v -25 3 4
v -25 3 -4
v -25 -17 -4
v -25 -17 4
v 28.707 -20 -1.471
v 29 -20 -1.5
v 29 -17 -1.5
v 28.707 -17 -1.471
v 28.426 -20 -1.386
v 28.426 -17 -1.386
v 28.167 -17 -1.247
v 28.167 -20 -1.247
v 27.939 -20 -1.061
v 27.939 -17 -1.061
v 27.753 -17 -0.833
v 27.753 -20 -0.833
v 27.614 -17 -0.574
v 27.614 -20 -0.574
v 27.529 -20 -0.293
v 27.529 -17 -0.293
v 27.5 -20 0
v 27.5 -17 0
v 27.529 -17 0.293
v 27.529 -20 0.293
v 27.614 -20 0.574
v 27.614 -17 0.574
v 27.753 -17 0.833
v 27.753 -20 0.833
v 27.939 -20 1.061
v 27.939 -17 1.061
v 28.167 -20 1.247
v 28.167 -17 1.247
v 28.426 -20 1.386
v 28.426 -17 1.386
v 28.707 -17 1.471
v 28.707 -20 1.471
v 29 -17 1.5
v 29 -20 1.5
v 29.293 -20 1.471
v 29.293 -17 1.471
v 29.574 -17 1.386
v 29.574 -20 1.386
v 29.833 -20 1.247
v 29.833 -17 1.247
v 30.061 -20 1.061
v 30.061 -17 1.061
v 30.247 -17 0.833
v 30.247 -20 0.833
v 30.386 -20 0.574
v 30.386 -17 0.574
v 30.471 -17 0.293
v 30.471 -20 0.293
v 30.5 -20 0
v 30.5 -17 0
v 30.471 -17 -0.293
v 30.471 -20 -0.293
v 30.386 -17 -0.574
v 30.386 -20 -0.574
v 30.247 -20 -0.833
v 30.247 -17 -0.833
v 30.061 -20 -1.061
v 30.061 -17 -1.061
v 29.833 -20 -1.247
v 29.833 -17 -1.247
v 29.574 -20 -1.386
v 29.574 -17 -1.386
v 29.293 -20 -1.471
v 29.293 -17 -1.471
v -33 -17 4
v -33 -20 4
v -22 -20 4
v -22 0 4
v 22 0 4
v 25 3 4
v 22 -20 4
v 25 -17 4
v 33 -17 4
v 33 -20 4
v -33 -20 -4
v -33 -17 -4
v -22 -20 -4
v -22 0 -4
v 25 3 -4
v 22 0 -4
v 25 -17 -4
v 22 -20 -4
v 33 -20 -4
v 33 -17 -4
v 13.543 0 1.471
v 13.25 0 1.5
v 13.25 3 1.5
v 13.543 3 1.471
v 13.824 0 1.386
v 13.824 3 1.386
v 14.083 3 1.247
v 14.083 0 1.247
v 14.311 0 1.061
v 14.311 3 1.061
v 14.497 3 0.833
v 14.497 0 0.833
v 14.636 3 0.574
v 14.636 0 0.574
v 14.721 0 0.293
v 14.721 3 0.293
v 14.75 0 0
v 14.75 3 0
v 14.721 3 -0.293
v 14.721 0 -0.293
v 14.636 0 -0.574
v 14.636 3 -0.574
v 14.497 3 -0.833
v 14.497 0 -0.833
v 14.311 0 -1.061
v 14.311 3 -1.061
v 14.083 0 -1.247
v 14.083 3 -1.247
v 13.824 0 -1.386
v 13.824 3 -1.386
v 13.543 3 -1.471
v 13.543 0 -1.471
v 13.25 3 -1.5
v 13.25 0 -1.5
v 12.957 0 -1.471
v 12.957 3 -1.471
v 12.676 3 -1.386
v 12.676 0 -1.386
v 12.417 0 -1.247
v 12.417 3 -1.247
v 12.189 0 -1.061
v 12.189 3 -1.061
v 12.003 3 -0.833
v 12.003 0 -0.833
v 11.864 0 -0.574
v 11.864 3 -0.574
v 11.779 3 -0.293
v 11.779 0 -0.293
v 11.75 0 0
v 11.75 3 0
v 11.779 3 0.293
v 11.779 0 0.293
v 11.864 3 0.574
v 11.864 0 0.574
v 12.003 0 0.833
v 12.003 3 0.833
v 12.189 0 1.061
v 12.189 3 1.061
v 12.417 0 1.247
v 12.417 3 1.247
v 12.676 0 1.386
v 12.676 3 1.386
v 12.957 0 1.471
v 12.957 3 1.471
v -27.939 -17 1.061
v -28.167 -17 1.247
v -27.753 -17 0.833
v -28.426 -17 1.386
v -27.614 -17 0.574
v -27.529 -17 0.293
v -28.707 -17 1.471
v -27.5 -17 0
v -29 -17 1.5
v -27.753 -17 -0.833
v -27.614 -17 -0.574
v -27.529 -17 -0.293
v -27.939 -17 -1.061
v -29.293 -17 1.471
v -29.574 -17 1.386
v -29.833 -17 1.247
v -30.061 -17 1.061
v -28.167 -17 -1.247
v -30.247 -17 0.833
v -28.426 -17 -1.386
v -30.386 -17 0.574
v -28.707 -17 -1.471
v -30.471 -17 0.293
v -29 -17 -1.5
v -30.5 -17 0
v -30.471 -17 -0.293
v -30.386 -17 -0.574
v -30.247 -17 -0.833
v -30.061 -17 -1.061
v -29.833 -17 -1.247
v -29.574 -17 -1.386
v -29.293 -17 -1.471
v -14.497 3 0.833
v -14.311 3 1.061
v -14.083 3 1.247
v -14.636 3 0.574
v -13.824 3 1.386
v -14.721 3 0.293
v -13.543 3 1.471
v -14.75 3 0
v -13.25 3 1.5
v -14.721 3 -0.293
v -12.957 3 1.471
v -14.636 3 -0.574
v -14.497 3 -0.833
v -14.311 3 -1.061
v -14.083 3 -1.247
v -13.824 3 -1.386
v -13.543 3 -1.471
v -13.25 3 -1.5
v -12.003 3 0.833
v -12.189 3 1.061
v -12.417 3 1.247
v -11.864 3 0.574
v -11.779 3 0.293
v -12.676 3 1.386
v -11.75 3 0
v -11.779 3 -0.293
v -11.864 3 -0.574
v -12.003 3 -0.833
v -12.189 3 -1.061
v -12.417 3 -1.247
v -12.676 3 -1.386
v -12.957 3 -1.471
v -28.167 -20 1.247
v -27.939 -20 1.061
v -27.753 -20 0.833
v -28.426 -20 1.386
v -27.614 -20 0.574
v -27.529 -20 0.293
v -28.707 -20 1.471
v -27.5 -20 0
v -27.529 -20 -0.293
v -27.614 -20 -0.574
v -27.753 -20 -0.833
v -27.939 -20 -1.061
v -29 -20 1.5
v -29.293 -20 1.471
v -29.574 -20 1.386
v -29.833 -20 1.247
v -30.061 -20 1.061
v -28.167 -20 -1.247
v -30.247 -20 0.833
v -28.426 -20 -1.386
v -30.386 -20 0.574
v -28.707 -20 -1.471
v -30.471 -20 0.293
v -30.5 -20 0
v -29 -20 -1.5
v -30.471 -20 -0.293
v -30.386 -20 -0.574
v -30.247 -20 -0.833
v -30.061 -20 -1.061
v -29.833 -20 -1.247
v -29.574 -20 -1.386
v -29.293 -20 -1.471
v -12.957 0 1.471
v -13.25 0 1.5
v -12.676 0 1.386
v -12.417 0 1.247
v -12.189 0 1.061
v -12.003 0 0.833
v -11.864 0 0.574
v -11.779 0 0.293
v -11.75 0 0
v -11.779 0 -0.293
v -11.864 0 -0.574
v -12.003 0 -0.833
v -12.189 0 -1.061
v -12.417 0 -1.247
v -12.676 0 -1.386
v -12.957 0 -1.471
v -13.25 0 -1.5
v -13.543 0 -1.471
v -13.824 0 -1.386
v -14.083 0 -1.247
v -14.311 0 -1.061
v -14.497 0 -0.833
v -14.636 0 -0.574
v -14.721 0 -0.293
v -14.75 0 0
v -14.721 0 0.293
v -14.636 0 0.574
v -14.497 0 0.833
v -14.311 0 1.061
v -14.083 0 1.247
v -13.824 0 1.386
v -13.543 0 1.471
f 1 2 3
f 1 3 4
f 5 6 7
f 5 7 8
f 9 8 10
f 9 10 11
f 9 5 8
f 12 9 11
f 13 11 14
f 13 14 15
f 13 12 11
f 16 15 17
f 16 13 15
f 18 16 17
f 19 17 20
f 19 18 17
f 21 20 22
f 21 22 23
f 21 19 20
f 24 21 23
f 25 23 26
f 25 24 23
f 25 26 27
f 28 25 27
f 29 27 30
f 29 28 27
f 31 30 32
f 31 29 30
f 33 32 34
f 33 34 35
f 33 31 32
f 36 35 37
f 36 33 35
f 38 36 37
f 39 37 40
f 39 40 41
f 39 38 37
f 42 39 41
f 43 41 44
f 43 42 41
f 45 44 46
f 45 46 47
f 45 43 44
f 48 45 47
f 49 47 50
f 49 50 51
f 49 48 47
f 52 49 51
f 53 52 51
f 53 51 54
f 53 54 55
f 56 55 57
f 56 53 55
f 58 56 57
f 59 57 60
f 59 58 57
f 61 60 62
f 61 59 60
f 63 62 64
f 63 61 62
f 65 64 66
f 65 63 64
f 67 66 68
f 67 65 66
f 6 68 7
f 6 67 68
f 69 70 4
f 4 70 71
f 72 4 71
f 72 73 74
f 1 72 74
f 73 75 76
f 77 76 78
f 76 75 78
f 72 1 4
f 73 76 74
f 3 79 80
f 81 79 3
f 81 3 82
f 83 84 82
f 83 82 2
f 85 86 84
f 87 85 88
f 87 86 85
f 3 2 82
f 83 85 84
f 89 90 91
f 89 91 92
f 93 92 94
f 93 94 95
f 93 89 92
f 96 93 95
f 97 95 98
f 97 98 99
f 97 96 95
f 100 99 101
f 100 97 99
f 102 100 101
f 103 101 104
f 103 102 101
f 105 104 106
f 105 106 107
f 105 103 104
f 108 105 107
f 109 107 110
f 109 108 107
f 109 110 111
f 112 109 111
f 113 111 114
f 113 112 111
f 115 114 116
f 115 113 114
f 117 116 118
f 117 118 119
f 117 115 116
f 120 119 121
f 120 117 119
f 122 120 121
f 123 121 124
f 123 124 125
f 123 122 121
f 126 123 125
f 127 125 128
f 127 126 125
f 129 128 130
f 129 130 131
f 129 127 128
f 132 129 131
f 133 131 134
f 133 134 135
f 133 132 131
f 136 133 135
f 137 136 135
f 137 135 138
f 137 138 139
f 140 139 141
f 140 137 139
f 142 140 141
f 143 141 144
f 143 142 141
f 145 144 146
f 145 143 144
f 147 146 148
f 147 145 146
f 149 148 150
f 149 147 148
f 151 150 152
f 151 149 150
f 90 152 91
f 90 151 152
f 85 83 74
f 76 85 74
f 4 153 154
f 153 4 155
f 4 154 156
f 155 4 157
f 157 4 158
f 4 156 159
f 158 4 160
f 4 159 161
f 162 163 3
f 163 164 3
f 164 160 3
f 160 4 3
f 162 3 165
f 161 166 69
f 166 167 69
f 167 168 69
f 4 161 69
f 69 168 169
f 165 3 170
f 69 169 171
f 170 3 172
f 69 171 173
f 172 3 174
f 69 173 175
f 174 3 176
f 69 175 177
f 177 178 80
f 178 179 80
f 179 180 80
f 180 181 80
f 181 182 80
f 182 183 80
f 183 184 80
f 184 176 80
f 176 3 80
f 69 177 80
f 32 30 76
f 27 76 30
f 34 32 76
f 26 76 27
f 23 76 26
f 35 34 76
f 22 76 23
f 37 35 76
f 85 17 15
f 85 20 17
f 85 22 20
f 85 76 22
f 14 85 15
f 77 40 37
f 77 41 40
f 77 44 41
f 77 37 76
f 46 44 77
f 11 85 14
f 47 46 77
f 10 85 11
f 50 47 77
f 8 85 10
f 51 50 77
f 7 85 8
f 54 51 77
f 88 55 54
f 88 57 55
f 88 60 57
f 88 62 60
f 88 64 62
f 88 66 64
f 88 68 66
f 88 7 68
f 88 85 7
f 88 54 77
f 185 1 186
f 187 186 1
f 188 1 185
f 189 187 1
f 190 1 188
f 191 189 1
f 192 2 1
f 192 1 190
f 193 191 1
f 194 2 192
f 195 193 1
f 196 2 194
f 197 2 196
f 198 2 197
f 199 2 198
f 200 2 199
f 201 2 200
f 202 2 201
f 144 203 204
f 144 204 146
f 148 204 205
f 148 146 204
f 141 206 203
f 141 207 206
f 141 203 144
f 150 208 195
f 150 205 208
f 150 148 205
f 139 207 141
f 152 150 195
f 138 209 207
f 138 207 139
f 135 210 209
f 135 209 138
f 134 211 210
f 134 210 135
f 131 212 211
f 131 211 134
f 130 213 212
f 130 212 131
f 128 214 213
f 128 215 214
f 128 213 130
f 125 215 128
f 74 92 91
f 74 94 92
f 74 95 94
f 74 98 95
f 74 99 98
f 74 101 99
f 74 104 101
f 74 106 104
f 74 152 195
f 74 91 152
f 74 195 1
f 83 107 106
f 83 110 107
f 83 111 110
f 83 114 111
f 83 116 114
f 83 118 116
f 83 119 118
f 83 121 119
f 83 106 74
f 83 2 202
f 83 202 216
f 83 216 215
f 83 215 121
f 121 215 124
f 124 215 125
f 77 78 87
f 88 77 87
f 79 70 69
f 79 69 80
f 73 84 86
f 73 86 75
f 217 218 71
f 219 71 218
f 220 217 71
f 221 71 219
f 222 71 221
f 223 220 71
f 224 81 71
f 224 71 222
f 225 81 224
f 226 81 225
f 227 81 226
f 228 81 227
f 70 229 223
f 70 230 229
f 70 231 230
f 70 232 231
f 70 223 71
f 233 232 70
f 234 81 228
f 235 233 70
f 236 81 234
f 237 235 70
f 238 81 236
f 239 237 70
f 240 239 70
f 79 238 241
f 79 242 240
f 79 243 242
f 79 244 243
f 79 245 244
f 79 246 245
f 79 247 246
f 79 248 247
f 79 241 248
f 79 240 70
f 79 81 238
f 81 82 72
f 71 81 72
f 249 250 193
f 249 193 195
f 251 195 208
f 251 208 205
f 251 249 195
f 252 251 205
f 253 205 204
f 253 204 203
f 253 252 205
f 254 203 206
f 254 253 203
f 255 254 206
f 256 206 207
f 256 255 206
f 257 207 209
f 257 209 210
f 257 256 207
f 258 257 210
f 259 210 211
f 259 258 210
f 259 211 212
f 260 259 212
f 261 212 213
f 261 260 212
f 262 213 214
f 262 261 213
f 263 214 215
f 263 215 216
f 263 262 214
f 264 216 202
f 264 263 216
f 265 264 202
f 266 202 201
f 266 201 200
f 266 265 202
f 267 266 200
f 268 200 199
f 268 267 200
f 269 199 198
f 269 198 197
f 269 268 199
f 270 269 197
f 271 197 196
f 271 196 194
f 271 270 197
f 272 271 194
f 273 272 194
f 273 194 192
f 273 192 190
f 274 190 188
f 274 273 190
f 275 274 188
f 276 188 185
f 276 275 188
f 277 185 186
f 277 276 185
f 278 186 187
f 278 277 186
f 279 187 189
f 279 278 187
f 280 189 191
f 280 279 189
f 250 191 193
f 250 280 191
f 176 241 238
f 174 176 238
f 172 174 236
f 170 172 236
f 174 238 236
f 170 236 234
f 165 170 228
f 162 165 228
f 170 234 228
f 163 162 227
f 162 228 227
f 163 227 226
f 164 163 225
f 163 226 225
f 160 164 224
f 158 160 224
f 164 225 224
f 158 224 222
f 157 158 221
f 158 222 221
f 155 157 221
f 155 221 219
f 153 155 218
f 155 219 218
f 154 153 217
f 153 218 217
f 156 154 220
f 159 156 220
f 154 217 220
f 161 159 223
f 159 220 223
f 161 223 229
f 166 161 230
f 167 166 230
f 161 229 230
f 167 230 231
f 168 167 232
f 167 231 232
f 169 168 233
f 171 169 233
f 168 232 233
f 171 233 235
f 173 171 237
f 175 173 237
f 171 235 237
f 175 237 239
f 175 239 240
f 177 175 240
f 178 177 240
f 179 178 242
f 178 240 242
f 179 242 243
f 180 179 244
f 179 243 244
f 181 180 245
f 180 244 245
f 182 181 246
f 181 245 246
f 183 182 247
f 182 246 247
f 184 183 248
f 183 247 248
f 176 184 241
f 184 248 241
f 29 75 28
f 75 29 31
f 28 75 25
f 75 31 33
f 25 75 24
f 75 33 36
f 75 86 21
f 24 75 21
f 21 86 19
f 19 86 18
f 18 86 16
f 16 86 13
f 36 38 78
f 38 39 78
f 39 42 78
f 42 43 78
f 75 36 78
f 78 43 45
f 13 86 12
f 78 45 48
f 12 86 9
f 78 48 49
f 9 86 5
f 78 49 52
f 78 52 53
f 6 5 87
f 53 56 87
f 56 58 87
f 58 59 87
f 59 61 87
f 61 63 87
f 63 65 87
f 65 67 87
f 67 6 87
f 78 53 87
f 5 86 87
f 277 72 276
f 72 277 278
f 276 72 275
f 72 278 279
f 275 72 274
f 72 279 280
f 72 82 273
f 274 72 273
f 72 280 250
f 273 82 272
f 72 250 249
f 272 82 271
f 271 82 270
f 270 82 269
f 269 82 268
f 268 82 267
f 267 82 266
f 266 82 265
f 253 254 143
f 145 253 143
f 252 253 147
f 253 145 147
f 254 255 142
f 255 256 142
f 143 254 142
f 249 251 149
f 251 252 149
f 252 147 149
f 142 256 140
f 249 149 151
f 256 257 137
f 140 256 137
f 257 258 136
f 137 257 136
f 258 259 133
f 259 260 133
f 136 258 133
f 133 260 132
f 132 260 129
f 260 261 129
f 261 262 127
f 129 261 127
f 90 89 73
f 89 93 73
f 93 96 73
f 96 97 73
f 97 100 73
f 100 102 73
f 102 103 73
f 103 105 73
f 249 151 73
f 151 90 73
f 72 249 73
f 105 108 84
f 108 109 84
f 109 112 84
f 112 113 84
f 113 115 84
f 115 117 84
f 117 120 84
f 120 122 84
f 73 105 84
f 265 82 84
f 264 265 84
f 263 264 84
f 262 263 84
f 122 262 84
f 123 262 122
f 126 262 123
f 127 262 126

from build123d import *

# Parameters (mm, degrees)
SKETCH1_W           = 50
SKETCH1_H           = 8
SKETCH1_R           = 1.5
BOSS_EXTRUDE1_DEPTH = 3
SKETCH2_W           = 3
SKETCH2_H           = 8
BOSS_EXTRUDE2_DEPTH = 20
SKETCH3_W           = 8
SKETCH3_H           = 8
SKETCH3_R           = 1.5
BOSS_EXTRUDE3_DEPTH = 3


with BuildPart() as part:
    # Sketch1 → Boss-Extrude1 (new body)
    with BuildSketch(Plane(origin=(0, 0, 0), x_dir=(1, 0, 0), z_dir=(0, 1, 0))):
        Rectangle(SKETCH1_W, SKETCH1_H)
        with Locations(Location((-13.25, 0, 0), (0, 0, 270))):
            Circle(SKETCH1_R, mode=Mode.SUBTRACT)
        with Locations(Location((13.25, 0, 0), (0, 0, 270))):
            Circle(SKETCH1_R, mode=Mode.SUBTRACT)
    extrude(amount=BOSS_EXTRUDE1_DEPTH)

    # Sketch2 → Boss-Extrude2 (add)
    with BuildSketch(Plane.XZ):
        with Locations((-23.5, 0)):
            Rectangle(SKETCH2_W, SKETCH2_H)
    boss_extrude2 = extrude(amount=BOSS_EXTRUDE2_DEPTH)

    # Sketch3 → Boss-Extrude3 (add)
    with BuildSketch(Plane(origin=(0, -20, 0), x_dir=(-1, 0, 0), z_dir=(0, -1, 0))):
        with Locations((29, 0)):
            Rectangle(SKETCH3_W, SKETCH3_H)
        with Locations(Location((29, 0, 0), (0, 0, 90))):
            Circle(SKETCH3_R, mode=Mode.SUBTRACT)
    boss_extrude3 = extrude(amount=-BOSS_EXTRUDE3_DEPTH)

    # Mirror1: Boss-Extrude2, Boss-Extrude3 across plane
    add(boss_extrude2.mirror(Plane(origin=(0, 0, 0), x_dir=(0, 0, 1), z_dir=(1, 0, 0))))
    add(boss_extrude3.mirror(Plane(origin=(0, 0, 0), x_dir=(0, 0, 1), z_dir=(1, 0, 0))))


solid = part.part
